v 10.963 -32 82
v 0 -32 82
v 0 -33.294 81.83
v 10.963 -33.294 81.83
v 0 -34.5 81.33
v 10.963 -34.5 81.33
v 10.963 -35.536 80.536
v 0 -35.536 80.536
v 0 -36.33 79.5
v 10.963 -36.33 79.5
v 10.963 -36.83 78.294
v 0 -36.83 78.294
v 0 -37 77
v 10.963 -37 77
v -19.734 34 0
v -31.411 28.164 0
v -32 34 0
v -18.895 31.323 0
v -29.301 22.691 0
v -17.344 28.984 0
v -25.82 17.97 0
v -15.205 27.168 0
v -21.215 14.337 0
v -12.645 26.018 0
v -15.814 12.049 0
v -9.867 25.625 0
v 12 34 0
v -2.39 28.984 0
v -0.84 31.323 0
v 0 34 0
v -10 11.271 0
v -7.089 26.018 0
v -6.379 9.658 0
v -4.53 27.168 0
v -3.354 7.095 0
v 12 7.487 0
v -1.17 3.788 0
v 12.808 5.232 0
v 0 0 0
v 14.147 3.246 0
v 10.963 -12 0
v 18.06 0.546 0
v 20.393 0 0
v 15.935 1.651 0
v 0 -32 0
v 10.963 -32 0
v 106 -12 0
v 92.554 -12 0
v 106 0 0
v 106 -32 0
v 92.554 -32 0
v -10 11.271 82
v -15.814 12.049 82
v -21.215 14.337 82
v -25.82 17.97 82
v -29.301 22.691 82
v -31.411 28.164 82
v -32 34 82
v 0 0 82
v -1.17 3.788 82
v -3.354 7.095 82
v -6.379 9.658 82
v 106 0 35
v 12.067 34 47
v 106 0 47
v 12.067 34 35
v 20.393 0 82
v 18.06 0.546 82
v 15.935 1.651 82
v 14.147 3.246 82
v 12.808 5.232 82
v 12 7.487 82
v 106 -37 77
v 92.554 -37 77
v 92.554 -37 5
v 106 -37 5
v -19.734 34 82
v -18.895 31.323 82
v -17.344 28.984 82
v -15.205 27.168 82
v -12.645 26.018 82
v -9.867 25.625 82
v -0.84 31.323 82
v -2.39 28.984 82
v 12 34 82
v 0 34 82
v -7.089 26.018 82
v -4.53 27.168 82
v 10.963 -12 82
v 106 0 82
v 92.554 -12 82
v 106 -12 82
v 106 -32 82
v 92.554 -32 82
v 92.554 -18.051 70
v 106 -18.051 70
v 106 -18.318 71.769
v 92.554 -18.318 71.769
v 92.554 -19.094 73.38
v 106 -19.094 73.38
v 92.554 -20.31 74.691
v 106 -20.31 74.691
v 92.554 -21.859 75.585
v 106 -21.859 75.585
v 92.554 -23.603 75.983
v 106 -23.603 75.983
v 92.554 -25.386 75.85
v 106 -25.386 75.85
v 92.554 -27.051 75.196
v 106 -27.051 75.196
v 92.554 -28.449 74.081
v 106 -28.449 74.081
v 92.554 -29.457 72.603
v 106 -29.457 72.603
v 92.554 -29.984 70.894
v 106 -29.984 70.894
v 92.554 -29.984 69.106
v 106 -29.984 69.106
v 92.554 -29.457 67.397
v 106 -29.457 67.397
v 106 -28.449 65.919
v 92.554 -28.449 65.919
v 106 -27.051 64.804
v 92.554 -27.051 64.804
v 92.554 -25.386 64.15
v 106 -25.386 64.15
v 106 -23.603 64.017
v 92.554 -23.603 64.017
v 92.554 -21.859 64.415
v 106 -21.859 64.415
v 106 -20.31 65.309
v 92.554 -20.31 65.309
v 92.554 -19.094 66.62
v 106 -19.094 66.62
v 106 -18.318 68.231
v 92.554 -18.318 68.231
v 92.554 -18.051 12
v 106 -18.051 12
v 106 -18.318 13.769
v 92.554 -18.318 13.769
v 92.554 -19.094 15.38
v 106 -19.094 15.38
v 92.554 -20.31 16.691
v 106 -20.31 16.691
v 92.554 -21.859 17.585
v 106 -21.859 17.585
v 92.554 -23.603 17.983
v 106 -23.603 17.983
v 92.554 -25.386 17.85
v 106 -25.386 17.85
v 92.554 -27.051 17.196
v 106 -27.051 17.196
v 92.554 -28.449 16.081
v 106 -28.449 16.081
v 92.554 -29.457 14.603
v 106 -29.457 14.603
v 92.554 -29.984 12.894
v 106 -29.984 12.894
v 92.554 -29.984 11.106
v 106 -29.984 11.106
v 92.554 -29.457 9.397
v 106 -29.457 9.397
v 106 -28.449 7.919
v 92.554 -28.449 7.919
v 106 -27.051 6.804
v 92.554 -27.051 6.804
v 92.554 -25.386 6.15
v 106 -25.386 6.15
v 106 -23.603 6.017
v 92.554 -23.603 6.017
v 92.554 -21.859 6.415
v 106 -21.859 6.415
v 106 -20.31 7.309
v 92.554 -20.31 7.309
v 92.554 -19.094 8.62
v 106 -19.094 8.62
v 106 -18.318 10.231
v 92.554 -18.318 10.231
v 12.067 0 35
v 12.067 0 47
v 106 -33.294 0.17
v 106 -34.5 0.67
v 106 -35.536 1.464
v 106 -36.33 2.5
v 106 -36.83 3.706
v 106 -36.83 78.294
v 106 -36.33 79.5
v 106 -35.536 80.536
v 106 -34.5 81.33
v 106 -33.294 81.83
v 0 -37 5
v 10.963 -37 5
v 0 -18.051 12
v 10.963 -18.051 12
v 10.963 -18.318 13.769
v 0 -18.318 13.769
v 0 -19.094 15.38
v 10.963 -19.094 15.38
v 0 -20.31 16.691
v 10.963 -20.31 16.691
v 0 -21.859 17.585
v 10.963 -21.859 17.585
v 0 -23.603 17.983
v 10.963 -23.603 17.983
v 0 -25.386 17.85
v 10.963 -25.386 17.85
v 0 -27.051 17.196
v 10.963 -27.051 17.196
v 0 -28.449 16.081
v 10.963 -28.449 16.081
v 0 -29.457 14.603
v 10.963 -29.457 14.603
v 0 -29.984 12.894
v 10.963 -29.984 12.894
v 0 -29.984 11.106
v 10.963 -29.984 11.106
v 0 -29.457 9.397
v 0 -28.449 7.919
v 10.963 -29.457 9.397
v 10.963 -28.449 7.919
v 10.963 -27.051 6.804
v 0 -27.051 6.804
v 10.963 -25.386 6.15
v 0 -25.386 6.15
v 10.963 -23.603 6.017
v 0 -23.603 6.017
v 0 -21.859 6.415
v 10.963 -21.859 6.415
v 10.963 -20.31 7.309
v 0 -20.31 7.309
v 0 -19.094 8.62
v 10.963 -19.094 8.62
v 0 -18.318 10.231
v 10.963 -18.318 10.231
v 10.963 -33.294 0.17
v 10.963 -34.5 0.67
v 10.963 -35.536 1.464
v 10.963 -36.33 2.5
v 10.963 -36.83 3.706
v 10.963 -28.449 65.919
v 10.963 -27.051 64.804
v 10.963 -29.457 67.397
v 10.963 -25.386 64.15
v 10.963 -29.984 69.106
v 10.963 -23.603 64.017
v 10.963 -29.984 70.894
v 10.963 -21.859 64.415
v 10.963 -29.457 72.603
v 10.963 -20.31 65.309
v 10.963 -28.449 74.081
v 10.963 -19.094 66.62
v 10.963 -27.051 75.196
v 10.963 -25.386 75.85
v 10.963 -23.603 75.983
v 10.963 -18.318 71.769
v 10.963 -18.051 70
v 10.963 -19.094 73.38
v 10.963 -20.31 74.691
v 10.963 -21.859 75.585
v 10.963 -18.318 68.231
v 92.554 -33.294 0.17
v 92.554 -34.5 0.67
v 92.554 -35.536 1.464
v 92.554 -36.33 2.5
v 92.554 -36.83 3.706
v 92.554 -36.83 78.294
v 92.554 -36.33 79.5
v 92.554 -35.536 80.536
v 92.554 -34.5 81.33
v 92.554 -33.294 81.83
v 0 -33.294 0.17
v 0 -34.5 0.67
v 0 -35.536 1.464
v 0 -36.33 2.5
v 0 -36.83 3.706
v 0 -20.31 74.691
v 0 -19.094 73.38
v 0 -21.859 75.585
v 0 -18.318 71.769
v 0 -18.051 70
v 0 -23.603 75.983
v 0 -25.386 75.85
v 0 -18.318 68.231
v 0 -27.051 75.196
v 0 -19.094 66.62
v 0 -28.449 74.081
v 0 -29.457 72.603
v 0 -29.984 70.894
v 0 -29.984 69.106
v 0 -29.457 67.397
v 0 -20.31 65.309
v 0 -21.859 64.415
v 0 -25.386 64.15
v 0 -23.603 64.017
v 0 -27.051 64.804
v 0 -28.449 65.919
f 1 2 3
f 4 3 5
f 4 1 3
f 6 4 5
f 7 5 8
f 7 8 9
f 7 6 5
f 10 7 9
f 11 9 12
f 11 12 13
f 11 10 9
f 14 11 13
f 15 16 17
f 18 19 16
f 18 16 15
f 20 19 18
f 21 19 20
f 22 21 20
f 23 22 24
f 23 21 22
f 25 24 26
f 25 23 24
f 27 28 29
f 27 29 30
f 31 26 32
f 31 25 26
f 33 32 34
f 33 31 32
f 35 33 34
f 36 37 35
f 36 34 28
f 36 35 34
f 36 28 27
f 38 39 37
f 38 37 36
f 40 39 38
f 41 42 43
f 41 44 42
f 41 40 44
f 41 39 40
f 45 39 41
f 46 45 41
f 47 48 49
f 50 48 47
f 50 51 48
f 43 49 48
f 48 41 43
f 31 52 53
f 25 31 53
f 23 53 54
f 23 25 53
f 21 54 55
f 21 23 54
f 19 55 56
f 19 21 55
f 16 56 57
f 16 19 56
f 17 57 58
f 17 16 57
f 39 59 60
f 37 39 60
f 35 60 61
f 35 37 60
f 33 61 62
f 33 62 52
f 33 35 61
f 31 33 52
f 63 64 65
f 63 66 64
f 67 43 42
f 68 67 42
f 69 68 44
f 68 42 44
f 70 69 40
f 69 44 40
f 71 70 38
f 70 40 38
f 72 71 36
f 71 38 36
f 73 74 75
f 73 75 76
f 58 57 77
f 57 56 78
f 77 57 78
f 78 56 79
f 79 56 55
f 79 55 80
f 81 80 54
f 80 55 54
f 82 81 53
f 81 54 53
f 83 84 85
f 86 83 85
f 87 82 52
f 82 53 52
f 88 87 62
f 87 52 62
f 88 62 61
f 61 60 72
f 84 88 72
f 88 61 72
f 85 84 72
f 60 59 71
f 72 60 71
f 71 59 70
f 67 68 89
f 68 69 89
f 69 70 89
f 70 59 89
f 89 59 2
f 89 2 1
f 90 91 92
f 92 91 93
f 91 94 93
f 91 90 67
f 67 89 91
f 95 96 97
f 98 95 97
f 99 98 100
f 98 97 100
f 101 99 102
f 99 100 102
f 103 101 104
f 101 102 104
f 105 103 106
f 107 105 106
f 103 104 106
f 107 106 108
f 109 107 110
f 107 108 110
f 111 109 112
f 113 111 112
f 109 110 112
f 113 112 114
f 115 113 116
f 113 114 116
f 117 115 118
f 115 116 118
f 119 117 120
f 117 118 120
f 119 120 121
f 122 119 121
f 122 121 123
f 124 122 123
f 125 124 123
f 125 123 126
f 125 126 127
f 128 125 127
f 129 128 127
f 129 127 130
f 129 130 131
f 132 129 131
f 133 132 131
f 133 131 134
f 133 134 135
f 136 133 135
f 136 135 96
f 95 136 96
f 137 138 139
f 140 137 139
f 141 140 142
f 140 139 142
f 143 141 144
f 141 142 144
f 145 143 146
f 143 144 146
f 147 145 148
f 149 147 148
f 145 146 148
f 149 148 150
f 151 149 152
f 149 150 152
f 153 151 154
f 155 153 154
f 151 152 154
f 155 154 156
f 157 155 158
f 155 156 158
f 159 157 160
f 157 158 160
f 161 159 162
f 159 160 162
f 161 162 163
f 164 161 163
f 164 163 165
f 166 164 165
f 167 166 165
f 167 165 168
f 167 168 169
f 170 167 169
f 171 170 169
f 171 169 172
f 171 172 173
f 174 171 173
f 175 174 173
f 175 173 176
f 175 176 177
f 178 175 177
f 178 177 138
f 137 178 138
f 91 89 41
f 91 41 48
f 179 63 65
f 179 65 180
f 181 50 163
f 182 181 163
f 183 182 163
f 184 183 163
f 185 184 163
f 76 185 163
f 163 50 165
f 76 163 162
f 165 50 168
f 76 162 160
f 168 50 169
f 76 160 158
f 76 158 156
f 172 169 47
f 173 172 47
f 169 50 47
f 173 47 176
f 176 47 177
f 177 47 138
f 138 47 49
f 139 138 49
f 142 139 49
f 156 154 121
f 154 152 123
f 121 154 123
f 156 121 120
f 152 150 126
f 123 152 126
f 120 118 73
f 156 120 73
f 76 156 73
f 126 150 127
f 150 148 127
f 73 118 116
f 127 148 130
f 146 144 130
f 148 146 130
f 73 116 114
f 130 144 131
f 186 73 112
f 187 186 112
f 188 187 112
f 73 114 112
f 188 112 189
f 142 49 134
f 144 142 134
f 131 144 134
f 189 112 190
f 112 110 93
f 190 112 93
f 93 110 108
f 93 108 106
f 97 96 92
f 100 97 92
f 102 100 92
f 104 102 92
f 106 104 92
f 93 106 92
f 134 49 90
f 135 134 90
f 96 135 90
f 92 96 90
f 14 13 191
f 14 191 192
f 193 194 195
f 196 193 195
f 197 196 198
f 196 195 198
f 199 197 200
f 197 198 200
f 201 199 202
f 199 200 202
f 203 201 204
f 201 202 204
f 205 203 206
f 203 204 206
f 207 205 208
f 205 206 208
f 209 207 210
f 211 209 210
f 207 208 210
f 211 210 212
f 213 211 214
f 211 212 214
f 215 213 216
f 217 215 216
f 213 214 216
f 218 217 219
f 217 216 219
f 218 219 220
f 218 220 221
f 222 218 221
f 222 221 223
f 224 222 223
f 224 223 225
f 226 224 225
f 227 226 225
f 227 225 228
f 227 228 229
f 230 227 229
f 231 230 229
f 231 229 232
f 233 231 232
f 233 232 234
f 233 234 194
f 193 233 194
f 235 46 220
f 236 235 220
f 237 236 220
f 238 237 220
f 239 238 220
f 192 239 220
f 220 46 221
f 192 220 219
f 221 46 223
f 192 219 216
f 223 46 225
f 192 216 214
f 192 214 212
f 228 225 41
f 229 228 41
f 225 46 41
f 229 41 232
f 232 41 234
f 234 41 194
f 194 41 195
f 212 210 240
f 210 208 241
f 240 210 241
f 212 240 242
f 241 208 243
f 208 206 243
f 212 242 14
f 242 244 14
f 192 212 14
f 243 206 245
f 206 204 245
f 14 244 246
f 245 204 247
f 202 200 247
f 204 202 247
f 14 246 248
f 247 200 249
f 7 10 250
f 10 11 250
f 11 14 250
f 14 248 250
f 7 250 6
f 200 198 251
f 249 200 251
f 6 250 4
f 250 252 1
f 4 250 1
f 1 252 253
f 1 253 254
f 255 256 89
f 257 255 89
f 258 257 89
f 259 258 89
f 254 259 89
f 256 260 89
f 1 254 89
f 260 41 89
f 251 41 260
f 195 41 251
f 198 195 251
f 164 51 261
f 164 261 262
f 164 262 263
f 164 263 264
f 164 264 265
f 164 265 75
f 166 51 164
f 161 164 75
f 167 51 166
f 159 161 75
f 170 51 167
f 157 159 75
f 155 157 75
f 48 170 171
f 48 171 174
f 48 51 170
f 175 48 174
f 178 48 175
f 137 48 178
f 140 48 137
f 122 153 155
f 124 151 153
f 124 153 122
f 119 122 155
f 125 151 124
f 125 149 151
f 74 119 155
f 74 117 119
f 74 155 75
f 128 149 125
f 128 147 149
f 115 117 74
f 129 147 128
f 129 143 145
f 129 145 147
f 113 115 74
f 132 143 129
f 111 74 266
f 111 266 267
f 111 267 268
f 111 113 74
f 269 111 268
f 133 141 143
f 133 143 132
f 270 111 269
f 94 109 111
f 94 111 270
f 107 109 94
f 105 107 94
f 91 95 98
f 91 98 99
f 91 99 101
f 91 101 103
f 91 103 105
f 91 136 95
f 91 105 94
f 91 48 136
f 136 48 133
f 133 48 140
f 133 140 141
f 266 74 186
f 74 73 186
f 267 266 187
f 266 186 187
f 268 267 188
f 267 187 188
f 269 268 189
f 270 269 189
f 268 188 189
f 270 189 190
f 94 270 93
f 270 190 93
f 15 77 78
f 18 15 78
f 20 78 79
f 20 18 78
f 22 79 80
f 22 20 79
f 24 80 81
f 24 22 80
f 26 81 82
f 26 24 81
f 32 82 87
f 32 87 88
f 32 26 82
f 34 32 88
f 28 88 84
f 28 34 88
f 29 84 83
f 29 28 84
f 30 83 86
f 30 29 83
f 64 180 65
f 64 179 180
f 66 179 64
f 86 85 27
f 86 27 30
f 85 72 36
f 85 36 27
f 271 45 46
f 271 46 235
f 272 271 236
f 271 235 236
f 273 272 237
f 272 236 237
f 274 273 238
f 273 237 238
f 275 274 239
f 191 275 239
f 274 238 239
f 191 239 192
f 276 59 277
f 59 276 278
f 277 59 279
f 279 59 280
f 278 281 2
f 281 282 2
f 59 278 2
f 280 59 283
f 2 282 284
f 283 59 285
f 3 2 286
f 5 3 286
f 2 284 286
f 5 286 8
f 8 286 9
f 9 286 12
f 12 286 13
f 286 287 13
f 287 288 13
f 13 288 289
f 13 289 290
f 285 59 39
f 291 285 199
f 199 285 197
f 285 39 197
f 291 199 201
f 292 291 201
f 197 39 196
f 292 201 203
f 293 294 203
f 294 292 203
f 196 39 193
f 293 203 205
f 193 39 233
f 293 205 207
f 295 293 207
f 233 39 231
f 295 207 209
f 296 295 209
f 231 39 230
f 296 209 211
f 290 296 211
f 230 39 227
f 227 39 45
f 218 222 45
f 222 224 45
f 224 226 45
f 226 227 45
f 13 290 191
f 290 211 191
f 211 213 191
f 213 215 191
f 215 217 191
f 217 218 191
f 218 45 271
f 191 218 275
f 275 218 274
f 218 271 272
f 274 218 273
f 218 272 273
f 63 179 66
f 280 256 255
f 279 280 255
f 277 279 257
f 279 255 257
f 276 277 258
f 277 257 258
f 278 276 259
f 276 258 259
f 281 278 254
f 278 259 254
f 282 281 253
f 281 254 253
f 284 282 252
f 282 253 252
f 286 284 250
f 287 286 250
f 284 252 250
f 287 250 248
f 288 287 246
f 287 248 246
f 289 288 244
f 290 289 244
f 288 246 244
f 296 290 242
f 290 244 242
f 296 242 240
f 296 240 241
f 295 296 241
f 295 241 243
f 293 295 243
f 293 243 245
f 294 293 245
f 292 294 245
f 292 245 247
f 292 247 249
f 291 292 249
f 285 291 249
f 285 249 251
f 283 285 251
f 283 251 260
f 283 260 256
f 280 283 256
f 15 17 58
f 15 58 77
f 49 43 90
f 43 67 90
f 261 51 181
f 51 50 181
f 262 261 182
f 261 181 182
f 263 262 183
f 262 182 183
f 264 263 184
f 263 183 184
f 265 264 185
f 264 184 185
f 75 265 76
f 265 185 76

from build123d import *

# Parameters (mm, degrees)
F0_W           = 106
F0_H           = 82
F1_DEPTH       = 12
F2_W           = 10.9627954662
F2_H           = 82
F2_W_2         = 13.4456468225
F3_DEPTH       = 25
F4_R           = 5
F7_DEPTH       = 6
F7_DEPTH_BACK  = 6
F8_R           = 6
F9_DEPTH       = 130
F11_DEPTH      = 82
F12_DEPTH      = 25
F14_DEPTH      = 41
F14_DEPTH_BACK = 41


with BuildPart() as f1:
    # F0 (on Front) → F1 (new body)
    with BuildSketch(Plane.XZ):
        with Locations((53, 41)):
            Rectangle(F0_W, F0_H)
    extrude(amount=F1_DEPTH)

    # F2 (on face) → F3 (join)
    with BuildSketch(Plane.XZ.offset(12)):
        with Locations((5.4813977331, 41)):
            Rectangle(F2_W, F2_H)
        with Locations((99.2771765888, 41)):
            Rectangle(F2_W_2, F2_H)
    extrude(amount=F3_DEPTH)

    # F4
    f4_edges = [f1.edges().sort_by_distance(p)[0] for p in [
        (99.277177, -37, 0),
        (99.277177, -37, 82),
        (5.481398, -37, 82),
        (5.481398, -37, 0),
    ]]
    fillet(f4_edges, radius=F4_R)

    # F8 (on face) → F9 (cut)
    with BuildSketch(Plane.YZ.offset(106)):
        with Locations((-24.0510478616, 12)):
            Circle(F8_R)
        with Locations((-24.0510478616, 70)):
            Circle(F8_R)
    extrude(amount=-F9_DEPTH, mode=Mode.SUBTRACT)



with BuildPart() as f7:
    # F6 (on mid) → F7 (new body, two sides)
    with BuildSketch(Plane(origin=(0, 0, 41), x_dir=(1, 0, 0), z_dir=(0, 0, -1))) as f7_sk:
        Polygon((12.0673676431, -34), (106, 0), (12.0673676431, 0), align=None)
    extrude(amount=F7_DEPTH)
    extrude(f7_sk.sketch, amount=-F7_DEPTH_BACK)


with BuildPart() as f11:
    # F10 (on Top) → F11 (new body)
    with BuildSketch(Plane.XY):
        with BuildLine():
            Line((22.4237125367, 0), (20.3928796507, 0))
            ThreePointArc((20.3928796507, 0), (21.4082960937, -0.0536304121), (22.4237125367, 0))
        make_face()
        Polygon((0, 34), (0, 0), (12, 0), (12, 7.4871135876), (12, 34), align=None)
        with BuildLine():
            Line((12, 7.4871135876), (12, 0))
            Line((12, 0), (20.3928796507, 0))
            ThreePointArc((20.3928796507, 0), (14.9913136852, 2.3926385074), (12, 7.4871135876))
        make_face()
    extrude(amount=F11_DEPTH)


with BuildPart() as f1_1:
    add(f1.part)

    add(f11.part)  # F12 merges F11
    # F10 (on Top) → F12 (join)
    with BuildSketch(Plane.XY):
        with BuildLine():
            Line((22.4237125367, 0), (20.3928796507, 0))
            ThreePointArc((20.3928796507, 0), (21.4082960937, -0.0536304121), (22.4237125367, 0))
        make_face()
        Polygon((0, 34), (0, 0), (12, 0), (12, 7.4871135876), (12, 34), align=None)
        with BuildLine():
            Line((12, 7.4871135876), (12, 0))
            Line((12, 0), (20.3928796507, 0))
            ThreePointArc((20.3928796507, 0), (14.9913136852, 2.3926385074), (12, 7.4871135876))
        make_face()
    extrude(amount=F12_DEPTH)

    # F13 (on mid) → F14 (join, two sides)
    with BuildSketch(Plane(origin=(0, 0, 41), x_dir=(1, 0, 0), z_dir=(0, 0, -1))) as f14_sk:
        with BuildLine():
            ThreePointArc((0, 0), (-3.3544641669, -7.0953494382), (-10, -11.270665832))
            ThreePointArc((-10, -11.270665832), (-25.8199946765, -17.9700012306), (-32, -34))
            Line((-32, -34), (-19.7342908604, -34))
            ThreePointArc((-19.7342908604, -34), (-9.8671454302, -25.6246356698), (0, -34))
            Line((0, -34), (0, 0))
        make_face()
    extrude(amount=F14_DEPTH)
    extrude(f14_sk.sketch, amount=-F14_DEPTH_BACK)


solid = Compound([f7.part, f1_1.part])
